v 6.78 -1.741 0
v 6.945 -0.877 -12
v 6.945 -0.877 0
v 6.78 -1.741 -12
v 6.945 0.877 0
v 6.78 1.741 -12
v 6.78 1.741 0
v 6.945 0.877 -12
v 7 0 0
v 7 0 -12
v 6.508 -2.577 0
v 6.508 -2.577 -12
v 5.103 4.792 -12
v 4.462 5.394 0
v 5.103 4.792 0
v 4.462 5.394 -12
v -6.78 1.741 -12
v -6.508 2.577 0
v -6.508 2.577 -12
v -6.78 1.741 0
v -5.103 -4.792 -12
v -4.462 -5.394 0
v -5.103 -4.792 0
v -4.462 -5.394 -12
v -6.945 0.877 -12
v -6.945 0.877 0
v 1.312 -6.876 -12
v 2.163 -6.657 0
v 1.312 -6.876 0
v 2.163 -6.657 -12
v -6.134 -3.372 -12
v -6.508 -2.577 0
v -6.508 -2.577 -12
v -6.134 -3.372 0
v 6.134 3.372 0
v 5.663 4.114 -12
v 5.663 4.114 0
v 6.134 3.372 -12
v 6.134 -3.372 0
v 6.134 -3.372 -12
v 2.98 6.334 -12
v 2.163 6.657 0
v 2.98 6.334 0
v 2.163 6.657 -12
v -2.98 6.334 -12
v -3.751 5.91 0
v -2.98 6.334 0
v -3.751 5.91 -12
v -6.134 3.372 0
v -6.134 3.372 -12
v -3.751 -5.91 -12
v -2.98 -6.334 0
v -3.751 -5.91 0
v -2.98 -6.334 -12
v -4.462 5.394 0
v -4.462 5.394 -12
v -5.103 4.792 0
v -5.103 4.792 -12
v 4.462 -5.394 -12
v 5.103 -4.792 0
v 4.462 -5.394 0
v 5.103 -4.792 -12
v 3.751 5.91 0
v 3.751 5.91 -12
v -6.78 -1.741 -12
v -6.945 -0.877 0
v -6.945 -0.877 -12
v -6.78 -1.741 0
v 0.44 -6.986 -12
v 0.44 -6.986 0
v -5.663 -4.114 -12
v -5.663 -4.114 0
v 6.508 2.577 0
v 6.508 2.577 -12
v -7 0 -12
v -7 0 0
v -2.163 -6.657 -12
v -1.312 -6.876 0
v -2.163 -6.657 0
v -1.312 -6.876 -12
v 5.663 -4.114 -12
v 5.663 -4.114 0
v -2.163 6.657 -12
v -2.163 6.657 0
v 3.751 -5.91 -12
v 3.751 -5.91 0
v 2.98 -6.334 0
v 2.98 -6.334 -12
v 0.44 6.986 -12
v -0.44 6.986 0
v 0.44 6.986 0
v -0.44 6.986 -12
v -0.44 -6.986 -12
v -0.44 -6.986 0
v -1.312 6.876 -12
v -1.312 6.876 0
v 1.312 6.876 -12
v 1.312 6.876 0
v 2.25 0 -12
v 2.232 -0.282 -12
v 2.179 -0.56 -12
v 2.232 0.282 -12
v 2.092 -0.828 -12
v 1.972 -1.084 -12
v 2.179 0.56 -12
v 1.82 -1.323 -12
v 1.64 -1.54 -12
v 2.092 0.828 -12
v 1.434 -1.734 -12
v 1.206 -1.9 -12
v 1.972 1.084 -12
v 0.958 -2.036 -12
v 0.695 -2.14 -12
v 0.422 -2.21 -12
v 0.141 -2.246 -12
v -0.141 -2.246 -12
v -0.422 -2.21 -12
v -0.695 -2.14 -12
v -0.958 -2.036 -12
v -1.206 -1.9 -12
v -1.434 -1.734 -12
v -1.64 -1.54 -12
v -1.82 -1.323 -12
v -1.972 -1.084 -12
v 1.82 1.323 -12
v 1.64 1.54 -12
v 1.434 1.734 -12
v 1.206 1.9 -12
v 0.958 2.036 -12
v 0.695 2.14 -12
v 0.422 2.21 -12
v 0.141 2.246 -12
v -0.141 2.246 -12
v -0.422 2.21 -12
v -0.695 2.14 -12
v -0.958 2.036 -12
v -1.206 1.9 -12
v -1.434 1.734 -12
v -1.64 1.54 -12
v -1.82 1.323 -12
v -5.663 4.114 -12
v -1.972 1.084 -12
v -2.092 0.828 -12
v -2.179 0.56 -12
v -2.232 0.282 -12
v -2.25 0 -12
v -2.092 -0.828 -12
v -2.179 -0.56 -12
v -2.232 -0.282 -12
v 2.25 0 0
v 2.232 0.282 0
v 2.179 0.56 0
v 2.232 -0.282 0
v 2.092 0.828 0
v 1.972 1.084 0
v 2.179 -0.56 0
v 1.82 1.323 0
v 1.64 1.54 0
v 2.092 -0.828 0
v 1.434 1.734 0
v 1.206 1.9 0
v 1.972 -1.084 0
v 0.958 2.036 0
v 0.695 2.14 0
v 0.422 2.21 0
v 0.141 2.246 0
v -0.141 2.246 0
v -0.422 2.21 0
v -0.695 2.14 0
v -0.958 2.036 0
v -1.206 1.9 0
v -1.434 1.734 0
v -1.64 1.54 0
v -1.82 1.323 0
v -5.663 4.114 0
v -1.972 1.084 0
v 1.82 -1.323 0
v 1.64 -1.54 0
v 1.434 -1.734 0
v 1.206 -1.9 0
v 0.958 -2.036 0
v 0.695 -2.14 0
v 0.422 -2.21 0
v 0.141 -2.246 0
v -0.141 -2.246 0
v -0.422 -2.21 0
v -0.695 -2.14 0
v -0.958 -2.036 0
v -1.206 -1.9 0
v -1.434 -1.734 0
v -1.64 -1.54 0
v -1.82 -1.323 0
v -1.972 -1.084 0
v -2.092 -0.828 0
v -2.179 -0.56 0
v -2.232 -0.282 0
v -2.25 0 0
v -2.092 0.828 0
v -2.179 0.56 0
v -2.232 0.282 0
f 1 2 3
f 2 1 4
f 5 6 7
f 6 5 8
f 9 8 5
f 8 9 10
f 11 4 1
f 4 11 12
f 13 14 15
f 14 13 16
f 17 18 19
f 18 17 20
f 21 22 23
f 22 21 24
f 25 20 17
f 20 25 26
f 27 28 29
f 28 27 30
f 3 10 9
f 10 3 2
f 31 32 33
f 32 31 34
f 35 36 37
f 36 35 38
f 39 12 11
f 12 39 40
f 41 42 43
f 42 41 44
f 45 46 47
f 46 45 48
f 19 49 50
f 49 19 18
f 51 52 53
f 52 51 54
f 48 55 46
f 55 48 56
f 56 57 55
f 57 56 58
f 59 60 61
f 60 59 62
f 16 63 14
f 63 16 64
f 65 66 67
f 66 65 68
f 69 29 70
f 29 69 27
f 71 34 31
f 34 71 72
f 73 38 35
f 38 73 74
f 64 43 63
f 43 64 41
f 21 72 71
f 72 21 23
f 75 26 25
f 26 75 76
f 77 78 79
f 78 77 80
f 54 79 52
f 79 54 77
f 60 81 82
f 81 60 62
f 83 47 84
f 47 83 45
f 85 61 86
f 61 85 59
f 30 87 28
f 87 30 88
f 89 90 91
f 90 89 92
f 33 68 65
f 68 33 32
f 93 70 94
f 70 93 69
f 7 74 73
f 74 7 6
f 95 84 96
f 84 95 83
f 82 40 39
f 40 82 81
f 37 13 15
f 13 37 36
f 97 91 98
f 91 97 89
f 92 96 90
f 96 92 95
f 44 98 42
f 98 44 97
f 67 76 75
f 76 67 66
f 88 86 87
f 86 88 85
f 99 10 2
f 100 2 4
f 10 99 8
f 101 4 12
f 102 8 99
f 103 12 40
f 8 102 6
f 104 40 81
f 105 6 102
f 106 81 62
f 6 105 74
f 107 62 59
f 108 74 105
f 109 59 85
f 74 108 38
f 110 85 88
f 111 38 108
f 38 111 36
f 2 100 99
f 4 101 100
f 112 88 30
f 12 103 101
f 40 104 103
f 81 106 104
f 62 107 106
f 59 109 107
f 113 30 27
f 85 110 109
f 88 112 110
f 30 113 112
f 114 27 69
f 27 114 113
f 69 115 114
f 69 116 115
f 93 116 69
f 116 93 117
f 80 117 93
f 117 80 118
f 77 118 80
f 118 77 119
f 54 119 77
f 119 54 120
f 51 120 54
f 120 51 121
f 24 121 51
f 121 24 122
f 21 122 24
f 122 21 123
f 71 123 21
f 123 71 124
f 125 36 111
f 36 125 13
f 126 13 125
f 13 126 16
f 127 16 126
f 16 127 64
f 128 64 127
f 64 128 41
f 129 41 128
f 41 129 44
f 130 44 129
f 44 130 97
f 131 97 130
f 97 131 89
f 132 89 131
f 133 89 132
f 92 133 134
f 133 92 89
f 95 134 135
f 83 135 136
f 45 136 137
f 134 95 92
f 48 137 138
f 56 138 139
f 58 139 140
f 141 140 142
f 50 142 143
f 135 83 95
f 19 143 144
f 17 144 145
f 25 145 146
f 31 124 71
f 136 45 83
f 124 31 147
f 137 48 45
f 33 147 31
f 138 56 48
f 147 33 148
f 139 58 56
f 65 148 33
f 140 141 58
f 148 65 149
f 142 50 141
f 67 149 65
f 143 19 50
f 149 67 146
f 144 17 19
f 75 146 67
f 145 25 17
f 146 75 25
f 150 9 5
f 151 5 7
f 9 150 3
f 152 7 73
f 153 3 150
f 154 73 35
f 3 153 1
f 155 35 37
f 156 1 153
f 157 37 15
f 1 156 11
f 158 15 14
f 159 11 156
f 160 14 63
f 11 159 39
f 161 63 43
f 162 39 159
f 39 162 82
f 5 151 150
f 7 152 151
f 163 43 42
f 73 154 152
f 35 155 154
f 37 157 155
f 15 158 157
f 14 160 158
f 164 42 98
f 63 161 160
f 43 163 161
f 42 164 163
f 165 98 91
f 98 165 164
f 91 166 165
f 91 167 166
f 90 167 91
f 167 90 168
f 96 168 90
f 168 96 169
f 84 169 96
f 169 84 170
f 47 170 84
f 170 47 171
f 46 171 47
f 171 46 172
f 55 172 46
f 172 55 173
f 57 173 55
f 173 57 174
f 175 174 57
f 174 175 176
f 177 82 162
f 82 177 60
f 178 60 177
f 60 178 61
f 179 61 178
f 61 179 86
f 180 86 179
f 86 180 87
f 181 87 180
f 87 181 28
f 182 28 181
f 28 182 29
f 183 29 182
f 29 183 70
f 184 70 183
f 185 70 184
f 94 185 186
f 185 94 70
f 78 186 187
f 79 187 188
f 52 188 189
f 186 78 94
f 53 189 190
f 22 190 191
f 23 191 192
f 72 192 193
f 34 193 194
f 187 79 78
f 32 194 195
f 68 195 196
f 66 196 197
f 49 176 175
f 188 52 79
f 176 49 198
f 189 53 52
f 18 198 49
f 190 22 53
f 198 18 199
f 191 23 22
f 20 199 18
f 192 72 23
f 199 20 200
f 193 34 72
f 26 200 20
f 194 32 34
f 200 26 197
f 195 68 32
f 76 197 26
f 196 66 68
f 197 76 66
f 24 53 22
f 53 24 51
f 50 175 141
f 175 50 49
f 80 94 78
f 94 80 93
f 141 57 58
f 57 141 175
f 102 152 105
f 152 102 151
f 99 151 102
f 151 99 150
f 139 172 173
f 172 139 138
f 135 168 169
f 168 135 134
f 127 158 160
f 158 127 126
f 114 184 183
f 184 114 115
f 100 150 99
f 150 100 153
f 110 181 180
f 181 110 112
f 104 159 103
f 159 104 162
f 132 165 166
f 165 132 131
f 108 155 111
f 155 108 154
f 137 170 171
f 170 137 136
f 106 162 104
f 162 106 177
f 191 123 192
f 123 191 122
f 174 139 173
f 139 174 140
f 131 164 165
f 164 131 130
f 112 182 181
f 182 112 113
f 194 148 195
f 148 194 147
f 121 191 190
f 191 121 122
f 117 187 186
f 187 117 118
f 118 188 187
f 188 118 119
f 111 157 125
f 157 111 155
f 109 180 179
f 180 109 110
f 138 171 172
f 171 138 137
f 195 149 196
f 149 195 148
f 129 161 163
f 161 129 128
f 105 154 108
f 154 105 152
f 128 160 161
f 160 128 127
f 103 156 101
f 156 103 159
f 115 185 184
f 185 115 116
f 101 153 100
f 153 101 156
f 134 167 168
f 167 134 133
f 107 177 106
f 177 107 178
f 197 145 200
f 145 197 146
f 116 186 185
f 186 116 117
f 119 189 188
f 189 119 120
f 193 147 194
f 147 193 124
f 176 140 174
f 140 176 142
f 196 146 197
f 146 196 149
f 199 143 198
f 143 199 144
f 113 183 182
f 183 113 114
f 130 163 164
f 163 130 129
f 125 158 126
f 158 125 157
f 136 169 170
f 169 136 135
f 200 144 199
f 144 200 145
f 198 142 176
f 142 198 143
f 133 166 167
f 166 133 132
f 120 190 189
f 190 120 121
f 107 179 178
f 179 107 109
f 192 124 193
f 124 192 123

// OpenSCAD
$fn = 50;


difference() {
	union() {
		translate(v = [0, 0, -12.0000000000]) {
			cylinder(h = 12, r = 7.0000000000);
		}
	}
	union() {
		#translate(v = [0, 0, -12]) {
			cylinder(h = 12, r = 2.2500000000);
		}
	}
}
